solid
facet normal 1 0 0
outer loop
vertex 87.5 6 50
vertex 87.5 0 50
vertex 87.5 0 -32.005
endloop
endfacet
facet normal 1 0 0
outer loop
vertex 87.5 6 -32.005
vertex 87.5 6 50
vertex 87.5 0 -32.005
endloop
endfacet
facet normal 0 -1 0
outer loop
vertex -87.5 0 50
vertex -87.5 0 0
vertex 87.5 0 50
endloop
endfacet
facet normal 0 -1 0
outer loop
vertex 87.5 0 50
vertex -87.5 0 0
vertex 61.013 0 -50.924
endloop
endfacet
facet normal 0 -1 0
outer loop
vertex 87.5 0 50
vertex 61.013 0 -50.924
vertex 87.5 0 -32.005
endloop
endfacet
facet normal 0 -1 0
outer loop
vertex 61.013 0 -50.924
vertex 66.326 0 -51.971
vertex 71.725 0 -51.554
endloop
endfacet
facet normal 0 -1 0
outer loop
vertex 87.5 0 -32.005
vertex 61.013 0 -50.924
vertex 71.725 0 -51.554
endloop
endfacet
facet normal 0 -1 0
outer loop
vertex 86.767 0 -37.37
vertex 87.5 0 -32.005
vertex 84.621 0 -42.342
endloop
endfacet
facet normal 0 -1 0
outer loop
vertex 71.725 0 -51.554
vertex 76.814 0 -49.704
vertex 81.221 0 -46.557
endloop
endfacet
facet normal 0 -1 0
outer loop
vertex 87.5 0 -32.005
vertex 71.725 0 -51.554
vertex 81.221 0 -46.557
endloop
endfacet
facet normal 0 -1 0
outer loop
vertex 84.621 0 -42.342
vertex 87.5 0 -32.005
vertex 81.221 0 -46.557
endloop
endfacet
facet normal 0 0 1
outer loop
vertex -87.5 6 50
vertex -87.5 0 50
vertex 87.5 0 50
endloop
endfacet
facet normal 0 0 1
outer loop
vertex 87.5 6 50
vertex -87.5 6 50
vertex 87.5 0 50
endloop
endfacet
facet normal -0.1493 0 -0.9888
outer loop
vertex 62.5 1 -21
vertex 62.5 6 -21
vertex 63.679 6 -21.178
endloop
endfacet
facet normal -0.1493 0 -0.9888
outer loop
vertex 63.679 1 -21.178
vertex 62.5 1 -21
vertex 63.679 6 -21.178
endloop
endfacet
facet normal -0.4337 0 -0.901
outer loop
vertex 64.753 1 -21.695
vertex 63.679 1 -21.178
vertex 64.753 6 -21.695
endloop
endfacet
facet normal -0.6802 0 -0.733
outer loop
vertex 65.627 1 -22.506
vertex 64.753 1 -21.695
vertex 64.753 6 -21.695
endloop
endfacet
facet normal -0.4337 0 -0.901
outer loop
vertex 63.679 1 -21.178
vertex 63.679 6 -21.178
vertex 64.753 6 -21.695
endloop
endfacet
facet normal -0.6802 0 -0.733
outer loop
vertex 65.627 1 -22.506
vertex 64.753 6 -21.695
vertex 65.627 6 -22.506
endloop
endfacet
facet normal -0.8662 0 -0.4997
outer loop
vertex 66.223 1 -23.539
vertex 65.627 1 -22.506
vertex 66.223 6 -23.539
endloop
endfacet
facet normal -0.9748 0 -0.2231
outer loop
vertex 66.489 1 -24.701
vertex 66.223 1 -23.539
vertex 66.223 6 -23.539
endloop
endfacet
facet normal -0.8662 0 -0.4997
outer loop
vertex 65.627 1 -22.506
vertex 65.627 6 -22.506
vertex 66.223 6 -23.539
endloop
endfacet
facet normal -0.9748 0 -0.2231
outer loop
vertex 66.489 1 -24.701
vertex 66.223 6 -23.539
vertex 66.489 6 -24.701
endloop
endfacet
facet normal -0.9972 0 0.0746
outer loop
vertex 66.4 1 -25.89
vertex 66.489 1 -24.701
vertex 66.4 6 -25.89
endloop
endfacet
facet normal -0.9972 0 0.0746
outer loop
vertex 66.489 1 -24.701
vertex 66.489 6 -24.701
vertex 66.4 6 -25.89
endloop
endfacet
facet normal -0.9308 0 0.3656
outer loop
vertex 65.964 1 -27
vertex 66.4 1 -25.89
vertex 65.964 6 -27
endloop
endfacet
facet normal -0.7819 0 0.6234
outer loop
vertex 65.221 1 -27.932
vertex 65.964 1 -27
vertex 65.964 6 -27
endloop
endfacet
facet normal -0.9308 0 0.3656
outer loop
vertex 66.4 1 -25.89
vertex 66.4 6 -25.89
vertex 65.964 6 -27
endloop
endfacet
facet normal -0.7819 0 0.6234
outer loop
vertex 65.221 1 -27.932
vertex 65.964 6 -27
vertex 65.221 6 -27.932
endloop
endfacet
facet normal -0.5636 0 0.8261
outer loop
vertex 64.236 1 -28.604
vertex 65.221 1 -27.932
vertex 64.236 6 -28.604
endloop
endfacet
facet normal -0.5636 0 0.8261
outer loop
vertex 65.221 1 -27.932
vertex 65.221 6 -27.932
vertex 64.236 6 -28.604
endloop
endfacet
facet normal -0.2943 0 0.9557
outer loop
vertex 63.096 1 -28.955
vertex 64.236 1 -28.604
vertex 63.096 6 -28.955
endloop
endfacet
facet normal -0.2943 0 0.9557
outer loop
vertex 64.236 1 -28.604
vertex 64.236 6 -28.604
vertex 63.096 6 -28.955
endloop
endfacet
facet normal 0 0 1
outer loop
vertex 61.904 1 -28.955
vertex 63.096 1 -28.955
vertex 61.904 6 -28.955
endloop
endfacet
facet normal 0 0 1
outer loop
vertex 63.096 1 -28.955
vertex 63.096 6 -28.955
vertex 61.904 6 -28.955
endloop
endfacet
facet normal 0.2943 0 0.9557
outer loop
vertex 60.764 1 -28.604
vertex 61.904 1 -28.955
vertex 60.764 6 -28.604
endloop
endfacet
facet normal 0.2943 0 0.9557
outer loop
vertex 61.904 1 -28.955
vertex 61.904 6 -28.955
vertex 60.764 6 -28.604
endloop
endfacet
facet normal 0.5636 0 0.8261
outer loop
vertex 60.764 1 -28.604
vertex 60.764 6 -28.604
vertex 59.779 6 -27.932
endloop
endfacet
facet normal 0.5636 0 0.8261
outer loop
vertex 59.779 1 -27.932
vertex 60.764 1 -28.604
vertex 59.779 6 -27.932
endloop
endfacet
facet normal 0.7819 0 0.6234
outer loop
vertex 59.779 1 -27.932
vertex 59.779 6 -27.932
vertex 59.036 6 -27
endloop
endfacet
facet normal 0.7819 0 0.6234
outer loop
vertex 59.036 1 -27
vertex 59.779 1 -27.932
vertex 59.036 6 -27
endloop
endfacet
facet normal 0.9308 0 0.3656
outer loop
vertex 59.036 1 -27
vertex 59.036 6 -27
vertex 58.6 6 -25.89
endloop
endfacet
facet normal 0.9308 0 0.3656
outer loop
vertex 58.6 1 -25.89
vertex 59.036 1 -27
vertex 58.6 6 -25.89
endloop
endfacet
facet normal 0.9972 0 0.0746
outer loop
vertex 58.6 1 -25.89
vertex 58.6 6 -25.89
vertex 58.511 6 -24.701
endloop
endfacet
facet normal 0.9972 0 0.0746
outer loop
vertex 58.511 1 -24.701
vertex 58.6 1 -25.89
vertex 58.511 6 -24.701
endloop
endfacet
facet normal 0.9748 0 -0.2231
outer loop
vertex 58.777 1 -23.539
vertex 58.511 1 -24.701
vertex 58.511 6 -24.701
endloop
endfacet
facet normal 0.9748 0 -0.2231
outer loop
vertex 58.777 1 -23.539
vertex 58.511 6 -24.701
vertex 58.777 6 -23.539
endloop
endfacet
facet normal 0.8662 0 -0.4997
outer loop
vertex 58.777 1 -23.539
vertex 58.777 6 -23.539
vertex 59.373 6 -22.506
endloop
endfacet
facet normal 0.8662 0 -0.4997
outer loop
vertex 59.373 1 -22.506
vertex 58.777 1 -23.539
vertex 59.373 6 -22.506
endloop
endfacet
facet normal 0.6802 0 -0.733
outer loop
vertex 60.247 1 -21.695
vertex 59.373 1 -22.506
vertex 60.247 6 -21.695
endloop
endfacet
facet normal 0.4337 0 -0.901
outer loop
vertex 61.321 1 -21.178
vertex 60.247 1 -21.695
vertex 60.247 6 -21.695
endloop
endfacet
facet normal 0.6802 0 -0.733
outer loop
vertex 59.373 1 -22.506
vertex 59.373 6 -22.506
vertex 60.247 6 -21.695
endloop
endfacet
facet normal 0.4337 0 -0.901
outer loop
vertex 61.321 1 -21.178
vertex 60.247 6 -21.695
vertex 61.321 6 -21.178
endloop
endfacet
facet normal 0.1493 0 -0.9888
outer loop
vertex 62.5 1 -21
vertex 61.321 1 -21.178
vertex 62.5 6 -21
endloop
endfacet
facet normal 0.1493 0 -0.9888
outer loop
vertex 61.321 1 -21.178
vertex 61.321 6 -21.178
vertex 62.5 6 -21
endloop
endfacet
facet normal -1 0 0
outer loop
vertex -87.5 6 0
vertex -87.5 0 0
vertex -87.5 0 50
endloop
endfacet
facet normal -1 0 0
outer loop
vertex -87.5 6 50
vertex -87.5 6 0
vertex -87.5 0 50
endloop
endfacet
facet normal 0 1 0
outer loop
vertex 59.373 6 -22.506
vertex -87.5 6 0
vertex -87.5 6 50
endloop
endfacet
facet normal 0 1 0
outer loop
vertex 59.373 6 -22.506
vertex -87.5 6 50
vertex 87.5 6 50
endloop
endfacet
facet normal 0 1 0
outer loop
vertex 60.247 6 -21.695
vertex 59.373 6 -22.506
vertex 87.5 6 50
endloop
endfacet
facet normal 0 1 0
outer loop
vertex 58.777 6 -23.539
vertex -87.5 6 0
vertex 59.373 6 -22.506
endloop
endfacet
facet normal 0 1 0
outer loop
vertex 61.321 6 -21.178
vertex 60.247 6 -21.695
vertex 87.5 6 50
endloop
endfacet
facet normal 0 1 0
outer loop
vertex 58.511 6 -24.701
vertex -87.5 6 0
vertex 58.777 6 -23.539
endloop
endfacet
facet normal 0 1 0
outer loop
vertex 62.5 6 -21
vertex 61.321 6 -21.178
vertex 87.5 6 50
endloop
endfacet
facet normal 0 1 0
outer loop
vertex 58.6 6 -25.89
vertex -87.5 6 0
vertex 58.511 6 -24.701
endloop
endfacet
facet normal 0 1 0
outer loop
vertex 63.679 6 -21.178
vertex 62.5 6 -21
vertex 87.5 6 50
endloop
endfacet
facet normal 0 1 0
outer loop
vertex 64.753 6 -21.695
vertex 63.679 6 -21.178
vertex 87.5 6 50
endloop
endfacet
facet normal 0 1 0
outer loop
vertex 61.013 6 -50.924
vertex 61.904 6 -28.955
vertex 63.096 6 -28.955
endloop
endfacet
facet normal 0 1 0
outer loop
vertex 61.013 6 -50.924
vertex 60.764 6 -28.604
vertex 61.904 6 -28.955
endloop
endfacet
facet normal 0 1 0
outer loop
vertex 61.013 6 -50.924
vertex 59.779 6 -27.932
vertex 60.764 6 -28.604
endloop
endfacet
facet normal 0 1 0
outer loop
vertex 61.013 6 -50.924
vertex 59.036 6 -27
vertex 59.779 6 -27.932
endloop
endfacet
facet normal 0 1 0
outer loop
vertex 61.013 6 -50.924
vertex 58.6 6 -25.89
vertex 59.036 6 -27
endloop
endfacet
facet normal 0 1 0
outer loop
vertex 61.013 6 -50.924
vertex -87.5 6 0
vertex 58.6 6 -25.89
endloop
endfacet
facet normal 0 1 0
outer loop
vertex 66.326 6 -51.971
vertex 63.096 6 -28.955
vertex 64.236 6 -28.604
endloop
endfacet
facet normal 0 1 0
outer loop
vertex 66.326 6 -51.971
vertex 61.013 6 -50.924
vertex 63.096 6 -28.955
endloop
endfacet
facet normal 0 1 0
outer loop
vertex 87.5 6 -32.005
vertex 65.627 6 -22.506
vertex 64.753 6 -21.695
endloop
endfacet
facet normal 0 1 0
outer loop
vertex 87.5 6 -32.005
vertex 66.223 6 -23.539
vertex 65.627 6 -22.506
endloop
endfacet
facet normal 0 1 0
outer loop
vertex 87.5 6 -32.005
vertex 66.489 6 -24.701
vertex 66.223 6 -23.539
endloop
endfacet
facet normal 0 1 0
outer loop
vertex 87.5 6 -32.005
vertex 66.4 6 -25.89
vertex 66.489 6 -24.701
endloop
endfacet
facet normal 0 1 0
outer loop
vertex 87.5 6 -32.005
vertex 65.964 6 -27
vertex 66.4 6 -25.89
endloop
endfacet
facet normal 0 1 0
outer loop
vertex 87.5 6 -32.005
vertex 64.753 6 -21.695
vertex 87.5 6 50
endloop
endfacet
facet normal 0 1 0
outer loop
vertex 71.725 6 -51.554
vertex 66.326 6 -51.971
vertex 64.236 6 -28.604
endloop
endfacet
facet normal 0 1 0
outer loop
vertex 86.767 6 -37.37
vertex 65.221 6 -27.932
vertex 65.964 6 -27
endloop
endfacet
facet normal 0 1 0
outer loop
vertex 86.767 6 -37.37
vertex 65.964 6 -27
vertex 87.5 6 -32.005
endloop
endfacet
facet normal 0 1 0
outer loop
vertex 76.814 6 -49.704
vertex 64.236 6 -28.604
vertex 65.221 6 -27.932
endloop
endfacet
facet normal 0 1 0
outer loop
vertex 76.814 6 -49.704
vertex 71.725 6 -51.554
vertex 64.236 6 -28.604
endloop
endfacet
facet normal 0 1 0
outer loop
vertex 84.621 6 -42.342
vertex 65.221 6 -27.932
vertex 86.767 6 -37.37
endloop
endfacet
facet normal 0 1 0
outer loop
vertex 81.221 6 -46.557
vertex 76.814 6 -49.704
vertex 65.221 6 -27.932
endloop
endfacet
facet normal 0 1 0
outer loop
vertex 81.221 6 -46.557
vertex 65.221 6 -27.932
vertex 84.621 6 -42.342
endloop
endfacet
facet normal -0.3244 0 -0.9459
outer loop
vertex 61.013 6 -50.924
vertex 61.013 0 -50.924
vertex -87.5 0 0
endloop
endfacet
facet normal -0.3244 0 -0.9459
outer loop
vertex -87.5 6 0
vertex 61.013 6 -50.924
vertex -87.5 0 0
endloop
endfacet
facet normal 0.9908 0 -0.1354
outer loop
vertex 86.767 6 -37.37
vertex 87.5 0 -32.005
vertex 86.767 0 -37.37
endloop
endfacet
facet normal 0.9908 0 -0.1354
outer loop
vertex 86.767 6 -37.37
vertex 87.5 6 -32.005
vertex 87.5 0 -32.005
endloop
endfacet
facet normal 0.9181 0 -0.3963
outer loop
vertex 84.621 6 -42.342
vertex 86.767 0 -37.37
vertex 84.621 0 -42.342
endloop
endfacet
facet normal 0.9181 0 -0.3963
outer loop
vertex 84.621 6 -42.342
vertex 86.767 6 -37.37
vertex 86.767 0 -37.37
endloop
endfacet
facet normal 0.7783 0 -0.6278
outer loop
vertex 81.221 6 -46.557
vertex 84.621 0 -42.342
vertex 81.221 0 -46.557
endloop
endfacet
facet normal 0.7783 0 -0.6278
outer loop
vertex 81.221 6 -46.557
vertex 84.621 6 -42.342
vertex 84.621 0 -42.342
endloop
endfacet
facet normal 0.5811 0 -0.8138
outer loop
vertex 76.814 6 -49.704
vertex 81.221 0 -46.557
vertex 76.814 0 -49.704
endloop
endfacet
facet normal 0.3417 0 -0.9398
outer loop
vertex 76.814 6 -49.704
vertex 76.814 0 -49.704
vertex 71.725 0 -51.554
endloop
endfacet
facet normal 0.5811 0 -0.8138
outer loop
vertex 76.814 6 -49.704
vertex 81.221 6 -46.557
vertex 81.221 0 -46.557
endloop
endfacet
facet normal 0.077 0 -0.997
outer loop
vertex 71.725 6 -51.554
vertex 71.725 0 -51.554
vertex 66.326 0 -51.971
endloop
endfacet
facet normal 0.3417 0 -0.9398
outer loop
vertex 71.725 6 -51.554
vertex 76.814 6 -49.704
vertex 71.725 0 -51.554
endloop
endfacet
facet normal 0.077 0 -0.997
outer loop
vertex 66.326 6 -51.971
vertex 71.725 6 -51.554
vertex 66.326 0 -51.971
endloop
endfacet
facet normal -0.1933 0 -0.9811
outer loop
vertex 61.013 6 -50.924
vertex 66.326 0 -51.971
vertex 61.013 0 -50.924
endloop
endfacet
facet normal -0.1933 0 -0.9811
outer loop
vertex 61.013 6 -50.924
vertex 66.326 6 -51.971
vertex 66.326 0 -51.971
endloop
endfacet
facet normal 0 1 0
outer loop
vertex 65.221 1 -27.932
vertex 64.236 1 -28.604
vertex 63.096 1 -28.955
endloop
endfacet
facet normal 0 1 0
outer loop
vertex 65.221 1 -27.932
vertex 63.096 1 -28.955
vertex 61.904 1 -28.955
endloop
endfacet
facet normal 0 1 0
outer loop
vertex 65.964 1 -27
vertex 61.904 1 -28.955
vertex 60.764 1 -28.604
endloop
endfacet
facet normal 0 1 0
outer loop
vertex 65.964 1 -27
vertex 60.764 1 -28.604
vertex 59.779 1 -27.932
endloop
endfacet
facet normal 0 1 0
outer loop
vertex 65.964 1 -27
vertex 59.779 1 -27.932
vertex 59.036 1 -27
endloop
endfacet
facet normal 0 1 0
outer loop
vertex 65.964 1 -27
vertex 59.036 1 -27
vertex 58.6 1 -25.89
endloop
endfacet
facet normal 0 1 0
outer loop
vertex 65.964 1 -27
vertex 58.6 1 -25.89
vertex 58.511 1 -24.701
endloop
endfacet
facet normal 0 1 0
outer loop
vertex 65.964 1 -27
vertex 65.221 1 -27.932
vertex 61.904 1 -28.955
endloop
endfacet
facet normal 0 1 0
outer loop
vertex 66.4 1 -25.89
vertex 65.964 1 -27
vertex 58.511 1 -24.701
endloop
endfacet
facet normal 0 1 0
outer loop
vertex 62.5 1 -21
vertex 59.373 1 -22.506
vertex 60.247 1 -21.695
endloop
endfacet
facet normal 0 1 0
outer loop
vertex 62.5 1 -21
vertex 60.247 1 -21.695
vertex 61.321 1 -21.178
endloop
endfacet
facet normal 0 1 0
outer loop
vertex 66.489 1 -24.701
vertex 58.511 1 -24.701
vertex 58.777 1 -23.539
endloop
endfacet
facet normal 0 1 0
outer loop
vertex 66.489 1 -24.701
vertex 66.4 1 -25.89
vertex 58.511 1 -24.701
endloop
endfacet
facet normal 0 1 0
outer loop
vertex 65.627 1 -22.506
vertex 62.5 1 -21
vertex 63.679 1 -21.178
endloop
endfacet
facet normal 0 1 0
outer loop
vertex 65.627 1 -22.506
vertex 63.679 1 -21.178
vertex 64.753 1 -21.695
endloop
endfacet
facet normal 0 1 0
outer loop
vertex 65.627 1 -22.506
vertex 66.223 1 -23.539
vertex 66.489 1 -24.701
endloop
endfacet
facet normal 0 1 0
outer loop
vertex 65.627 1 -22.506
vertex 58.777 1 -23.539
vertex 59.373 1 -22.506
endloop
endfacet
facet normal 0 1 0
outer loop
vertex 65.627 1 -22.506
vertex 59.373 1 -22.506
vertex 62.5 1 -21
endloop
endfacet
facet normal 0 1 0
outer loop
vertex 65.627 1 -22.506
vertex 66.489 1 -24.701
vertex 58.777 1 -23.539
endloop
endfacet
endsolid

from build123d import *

# Parameters (mm, degrees)
BOSS_EXTRUDE1_DEPTH = 6
FILLET2_R           = 20
SKETCH7_R           = 4
CUT_EXTRUDE3_DEPTH  = 5


with BuildPart() as part:
    # Sketch4 → Boss-Extrude1 (new body)
    with BuildSketch(Plane(origin=(0, 0, 0), x_dir=(1, 0, 0), z_dir=(0, 1, 0))):
        Polygon((-87.5, -50), (87.5, -50), (87.5, 0), (87.5, 60.006143386), (-87.5, 0), align=None)
    extrude(amount=BOSS_EXTRUDE1_DEPTH)

    # Fillet2
    fillet2_edges = [part.edges().sort_by_distance(p)[0] for p in [
        (87.5, 3, -60.006143386),
    ]]
    fillet(fillet2_edges, radius=FILLET2_R)

    # Sketch7 → Cut-Extrude3 (cut)
    with BuildSketch(Plane(origin=(0, 6, 0), x_dir=(1, 0, 0), z_dir=(0, 1, 0))):
        with Locations(Location((62.5, 25, 0), (0, 0, 270))):
            Circle(SKETCH7_R)
    extrude(amount=-CUT_EXTRUDE3_DEPTH, mode=Mode.SUBTRACT)


solid = part.part
